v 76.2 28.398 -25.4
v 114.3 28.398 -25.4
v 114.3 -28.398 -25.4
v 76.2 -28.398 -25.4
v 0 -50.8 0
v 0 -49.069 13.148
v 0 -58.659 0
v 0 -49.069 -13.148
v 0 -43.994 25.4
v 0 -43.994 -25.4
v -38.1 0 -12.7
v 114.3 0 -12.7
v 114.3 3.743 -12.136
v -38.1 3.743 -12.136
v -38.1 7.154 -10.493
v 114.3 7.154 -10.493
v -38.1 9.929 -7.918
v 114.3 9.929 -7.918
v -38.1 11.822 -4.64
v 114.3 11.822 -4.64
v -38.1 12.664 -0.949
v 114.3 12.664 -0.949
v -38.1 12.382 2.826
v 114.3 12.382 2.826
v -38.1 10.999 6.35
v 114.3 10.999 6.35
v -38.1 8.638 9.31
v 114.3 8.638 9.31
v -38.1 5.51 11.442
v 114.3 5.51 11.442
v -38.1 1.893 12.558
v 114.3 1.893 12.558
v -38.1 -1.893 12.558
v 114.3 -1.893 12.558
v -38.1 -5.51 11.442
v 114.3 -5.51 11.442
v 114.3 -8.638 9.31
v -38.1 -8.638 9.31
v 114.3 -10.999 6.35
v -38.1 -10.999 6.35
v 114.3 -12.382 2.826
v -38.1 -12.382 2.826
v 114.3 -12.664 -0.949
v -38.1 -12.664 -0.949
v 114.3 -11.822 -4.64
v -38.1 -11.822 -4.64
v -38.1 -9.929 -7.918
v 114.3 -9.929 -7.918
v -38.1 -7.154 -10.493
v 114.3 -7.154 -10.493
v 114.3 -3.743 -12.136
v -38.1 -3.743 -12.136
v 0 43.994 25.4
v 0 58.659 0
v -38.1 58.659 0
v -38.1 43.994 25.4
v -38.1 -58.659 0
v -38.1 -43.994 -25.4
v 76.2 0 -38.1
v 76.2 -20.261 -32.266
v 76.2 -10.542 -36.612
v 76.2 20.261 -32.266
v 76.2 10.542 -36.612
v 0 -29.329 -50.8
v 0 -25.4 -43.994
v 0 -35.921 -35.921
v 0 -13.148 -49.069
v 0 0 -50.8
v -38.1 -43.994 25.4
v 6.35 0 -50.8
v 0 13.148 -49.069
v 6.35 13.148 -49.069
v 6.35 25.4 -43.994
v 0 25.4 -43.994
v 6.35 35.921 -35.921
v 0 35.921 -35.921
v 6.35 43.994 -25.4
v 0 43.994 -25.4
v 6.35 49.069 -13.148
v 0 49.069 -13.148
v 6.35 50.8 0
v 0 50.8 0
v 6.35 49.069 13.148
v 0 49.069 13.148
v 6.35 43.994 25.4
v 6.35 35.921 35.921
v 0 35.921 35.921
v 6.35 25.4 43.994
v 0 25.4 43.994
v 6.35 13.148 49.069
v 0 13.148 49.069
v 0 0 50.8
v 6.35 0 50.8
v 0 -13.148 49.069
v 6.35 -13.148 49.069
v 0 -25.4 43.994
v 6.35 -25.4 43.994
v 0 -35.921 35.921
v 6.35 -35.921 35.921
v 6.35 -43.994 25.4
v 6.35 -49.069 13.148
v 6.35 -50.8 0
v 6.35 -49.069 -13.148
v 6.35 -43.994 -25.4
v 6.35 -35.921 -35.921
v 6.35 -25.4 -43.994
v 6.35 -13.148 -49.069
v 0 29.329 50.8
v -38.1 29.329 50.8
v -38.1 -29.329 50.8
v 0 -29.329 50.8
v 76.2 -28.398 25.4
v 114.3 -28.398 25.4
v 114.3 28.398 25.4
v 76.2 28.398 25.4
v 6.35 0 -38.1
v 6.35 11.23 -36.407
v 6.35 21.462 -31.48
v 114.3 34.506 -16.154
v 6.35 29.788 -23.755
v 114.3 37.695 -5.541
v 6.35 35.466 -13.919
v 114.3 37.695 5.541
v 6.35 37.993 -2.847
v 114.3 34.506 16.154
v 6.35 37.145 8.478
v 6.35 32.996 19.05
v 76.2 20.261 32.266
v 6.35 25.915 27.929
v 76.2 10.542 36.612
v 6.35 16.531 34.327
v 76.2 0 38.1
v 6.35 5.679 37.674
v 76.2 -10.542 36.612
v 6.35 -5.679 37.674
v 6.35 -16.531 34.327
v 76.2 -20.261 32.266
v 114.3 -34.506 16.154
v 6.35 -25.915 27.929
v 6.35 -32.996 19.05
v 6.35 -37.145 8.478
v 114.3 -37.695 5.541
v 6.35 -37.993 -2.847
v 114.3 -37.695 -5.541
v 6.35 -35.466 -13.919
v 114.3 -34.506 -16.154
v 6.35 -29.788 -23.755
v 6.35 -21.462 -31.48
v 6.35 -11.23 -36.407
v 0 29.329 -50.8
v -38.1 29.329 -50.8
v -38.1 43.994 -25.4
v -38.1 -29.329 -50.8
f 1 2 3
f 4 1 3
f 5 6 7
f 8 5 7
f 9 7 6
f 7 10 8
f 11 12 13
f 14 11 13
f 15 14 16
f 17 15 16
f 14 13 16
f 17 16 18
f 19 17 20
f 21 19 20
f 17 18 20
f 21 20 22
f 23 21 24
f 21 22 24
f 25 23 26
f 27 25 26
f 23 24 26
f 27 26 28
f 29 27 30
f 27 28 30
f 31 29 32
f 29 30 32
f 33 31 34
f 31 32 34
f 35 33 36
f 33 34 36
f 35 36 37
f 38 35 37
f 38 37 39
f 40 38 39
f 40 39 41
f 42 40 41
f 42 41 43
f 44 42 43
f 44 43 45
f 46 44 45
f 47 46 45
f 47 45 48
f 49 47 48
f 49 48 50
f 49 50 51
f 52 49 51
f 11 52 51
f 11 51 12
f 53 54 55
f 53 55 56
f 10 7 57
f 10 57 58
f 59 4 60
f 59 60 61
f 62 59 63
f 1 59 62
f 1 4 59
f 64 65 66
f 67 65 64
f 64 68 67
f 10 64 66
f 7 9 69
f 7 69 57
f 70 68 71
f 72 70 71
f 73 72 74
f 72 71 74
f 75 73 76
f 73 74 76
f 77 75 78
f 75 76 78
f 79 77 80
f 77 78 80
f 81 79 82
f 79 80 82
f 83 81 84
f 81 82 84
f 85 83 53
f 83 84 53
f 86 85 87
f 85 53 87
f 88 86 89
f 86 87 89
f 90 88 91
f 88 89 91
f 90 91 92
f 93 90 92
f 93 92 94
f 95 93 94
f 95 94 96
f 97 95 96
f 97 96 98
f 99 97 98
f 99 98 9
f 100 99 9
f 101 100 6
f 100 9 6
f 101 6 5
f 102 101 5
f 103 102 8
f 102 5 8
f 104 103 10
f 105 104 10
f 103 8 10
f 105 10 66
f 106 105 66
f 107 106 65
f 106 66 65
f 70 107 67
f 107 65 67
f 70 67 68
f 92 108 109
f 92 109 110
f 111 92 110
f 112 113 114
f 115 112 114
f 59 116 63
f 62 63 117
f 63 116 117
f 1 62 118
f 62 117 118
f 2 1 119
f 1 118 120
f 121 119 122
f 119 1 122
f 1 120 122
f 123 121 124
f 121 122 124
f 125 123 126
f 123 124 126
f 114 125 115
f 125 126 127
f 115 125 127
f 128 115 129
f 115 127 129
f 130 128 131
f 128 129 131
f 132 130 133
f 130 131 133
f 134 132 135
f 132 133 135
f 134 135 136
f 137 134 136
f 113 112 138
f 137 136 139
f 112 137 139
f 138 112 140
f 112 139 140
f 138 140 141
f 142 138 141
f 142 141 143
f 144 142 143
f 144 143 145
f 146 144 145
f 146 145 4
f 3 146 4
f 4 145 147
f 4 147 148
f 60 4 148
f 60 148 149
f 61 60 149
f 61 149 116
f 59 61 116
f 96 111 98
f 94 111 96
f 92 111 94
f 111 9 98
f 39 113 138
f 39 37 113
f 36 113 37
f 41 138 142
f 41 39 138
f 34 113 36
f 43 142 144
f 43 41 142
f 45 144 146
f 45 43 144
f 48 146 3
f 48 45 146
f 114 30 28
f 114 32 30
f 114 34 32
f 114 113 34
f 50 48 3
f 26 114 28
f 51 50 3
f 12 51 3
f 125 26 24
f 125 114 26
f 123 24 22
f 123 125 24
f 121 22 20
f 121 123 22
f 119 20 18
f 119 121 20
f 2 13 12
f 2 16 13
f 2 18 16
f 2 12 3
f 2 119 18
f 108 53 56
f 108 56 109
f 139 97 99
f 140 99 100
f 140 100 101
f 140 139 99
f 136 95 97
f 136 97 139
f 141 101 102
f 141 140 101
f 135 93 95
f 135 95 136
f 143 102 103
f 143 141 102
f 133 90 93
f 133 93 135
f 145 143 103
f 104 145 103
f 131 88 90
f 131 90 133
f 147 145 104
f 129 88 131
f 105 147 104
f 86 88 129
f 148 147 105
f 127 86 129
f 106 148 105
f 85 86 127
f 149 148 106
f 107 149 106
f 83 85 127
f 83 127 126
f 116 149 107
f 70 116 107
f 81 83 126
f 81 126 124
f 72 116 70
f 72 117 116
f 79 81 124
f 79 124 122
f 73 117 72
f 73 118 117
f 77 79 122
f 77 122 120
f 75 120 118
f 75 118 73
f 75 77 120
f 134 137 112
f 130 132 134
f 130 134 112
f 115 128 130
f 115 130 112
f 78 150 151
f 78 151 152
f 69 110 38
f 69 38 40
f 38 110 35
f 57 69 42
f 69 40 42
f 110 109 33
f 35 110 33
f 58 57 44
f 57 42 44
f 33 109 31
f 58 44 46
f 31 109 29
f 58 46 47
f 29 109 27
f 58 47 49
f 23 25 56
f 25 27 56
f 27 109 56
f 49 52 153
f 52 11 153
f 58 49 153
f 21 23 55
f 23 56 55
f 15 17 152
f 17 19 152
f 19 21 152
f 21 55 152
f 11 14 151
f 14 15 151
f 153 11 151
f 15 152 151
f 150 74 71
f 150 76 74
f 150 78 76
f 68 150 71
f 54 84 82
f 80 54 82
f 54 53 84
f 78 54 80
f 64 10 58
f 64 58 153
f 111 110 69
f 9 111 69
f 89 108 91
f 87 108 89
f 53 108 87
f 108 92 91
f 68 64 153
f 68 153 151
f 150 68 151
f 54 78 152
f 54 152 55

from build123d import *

# Parameters (mm, degrees)
BOSS_EXTRUDE1_DEPTH = 38.1
BOSS_EXTRUDE2_DEPTH = 6.35
SKETCH2_R           = 38.1
BOSS_EXTRUDE3_DEPTH = 107.95
SKETCH3_R           = 12.7
CUT_EXTRUDE1_DEPTH  = 172.018283623
CUT_EXTRUDE2_START  = -38.1
CUT_EXTRUDE2_DEPTH  = 38.1


with BuildPart() as part:
    # Sketch1 → Boss-Extrude1 (new body)
    with BuildSketch(Plane(origin=(0, 0, 0), x_dir=(0, 0, -1), z_dir=(1, 0, 0))):
        Polygon((50.8, 29.329393675), (0, 58.65878735), (-50.8, 29.329393675), (-50.8, -29.329393675), (0, -58.65878735), (50.8, -29.329393675), align=None)
    extrude(amount=-BOSS_EXTRUDE1_DEPTH)

    # Sketch1<3> → Boss-Extrude2 (add)
    with BuildSketch(Plane(origin=(0, 0, 0), x_dir=(0, 0, -1), z_dir=(1, 0, 0))):
        with BuildLine():
            ThreePointArc((50.8, 0), (43.994090583, 25.399999877), (25.400000247, 43.99409037))
            ThreePointArc((25.400000247, 43.99409037), (3.52e-07, 50.8), (-25.399999637, 43.994090722))
            ThreePointArc((-25.399999637, 43.994090722), (-43.994090395, 25.400000202), (-50.8, 4.8e-08))
            ThreePointArc((-50.8, 4.8e-08), (-43.994090651, -25.399999759), (-25.400000441, -43.994090258))
            ThreePointArc((-25.400000441, -43.994090258), (-2.2e-07, -50.8), (25.400000059, -43.994090478))
            ThreePointArc((25.400000059, -43.994090478), (43.994090529, -25.39999997), (50.8, 0))
        make_face()
    extrude(amount=BOSS_EXTRUDE2_DEPTH)

    # Sketch2 → Boss-Extrude3 (add)
    with BuildSketch(Plane(origin=(6.35, 0, 0), x_dir=(0, 0, -1), z_dir=(1, 0, 0))):
        Circle(SKETCH2_R)
    extrude(amount=BOSS_EXTRUDE3_DEPTH)

    # Sketch3 → Cut-Extrude1 (cut, through all)
    with BuildSketch(Plane(origin=(114.3, 0, 0), x_dir=(0, 0, -1), z_dir=(1, 0, 0))):
        Circle(SKETCH3_R)
    extrude(amount=-CUT_EXTRUDE1_DEPTH, mode=Mode.SUBTRACT)

    # Sketch3<3> → Cut-Extrude2 (cut)
    with BuildSketch(Plane(origin=(114.3, 0, 0), x_dir=(0, 0, -1), z_dir=(1, 0, 0)).offset(CUT_EXTRUDE2_START)):
        with BuildLine():
            Line((-25.4, -28.398063314), (-25.4, 28.398063314))
            ThreePointArc((-25.4, 28.398063314), (-38.1, 0), (-25.4, -28.398063314))
        make_face()
        with BuildLine():
            ThreePointArc((25.4, -28.398063314), (38.1, 0), (25.4, 28.398063314))
            Line((25.4, 28.398063314), (25.4, -28.398063314))
        make_face()
    extrude(amount=CUT_EXTRUDE2_DEPTH, mode=Mode.SUBTRACT)


solid = part.part
